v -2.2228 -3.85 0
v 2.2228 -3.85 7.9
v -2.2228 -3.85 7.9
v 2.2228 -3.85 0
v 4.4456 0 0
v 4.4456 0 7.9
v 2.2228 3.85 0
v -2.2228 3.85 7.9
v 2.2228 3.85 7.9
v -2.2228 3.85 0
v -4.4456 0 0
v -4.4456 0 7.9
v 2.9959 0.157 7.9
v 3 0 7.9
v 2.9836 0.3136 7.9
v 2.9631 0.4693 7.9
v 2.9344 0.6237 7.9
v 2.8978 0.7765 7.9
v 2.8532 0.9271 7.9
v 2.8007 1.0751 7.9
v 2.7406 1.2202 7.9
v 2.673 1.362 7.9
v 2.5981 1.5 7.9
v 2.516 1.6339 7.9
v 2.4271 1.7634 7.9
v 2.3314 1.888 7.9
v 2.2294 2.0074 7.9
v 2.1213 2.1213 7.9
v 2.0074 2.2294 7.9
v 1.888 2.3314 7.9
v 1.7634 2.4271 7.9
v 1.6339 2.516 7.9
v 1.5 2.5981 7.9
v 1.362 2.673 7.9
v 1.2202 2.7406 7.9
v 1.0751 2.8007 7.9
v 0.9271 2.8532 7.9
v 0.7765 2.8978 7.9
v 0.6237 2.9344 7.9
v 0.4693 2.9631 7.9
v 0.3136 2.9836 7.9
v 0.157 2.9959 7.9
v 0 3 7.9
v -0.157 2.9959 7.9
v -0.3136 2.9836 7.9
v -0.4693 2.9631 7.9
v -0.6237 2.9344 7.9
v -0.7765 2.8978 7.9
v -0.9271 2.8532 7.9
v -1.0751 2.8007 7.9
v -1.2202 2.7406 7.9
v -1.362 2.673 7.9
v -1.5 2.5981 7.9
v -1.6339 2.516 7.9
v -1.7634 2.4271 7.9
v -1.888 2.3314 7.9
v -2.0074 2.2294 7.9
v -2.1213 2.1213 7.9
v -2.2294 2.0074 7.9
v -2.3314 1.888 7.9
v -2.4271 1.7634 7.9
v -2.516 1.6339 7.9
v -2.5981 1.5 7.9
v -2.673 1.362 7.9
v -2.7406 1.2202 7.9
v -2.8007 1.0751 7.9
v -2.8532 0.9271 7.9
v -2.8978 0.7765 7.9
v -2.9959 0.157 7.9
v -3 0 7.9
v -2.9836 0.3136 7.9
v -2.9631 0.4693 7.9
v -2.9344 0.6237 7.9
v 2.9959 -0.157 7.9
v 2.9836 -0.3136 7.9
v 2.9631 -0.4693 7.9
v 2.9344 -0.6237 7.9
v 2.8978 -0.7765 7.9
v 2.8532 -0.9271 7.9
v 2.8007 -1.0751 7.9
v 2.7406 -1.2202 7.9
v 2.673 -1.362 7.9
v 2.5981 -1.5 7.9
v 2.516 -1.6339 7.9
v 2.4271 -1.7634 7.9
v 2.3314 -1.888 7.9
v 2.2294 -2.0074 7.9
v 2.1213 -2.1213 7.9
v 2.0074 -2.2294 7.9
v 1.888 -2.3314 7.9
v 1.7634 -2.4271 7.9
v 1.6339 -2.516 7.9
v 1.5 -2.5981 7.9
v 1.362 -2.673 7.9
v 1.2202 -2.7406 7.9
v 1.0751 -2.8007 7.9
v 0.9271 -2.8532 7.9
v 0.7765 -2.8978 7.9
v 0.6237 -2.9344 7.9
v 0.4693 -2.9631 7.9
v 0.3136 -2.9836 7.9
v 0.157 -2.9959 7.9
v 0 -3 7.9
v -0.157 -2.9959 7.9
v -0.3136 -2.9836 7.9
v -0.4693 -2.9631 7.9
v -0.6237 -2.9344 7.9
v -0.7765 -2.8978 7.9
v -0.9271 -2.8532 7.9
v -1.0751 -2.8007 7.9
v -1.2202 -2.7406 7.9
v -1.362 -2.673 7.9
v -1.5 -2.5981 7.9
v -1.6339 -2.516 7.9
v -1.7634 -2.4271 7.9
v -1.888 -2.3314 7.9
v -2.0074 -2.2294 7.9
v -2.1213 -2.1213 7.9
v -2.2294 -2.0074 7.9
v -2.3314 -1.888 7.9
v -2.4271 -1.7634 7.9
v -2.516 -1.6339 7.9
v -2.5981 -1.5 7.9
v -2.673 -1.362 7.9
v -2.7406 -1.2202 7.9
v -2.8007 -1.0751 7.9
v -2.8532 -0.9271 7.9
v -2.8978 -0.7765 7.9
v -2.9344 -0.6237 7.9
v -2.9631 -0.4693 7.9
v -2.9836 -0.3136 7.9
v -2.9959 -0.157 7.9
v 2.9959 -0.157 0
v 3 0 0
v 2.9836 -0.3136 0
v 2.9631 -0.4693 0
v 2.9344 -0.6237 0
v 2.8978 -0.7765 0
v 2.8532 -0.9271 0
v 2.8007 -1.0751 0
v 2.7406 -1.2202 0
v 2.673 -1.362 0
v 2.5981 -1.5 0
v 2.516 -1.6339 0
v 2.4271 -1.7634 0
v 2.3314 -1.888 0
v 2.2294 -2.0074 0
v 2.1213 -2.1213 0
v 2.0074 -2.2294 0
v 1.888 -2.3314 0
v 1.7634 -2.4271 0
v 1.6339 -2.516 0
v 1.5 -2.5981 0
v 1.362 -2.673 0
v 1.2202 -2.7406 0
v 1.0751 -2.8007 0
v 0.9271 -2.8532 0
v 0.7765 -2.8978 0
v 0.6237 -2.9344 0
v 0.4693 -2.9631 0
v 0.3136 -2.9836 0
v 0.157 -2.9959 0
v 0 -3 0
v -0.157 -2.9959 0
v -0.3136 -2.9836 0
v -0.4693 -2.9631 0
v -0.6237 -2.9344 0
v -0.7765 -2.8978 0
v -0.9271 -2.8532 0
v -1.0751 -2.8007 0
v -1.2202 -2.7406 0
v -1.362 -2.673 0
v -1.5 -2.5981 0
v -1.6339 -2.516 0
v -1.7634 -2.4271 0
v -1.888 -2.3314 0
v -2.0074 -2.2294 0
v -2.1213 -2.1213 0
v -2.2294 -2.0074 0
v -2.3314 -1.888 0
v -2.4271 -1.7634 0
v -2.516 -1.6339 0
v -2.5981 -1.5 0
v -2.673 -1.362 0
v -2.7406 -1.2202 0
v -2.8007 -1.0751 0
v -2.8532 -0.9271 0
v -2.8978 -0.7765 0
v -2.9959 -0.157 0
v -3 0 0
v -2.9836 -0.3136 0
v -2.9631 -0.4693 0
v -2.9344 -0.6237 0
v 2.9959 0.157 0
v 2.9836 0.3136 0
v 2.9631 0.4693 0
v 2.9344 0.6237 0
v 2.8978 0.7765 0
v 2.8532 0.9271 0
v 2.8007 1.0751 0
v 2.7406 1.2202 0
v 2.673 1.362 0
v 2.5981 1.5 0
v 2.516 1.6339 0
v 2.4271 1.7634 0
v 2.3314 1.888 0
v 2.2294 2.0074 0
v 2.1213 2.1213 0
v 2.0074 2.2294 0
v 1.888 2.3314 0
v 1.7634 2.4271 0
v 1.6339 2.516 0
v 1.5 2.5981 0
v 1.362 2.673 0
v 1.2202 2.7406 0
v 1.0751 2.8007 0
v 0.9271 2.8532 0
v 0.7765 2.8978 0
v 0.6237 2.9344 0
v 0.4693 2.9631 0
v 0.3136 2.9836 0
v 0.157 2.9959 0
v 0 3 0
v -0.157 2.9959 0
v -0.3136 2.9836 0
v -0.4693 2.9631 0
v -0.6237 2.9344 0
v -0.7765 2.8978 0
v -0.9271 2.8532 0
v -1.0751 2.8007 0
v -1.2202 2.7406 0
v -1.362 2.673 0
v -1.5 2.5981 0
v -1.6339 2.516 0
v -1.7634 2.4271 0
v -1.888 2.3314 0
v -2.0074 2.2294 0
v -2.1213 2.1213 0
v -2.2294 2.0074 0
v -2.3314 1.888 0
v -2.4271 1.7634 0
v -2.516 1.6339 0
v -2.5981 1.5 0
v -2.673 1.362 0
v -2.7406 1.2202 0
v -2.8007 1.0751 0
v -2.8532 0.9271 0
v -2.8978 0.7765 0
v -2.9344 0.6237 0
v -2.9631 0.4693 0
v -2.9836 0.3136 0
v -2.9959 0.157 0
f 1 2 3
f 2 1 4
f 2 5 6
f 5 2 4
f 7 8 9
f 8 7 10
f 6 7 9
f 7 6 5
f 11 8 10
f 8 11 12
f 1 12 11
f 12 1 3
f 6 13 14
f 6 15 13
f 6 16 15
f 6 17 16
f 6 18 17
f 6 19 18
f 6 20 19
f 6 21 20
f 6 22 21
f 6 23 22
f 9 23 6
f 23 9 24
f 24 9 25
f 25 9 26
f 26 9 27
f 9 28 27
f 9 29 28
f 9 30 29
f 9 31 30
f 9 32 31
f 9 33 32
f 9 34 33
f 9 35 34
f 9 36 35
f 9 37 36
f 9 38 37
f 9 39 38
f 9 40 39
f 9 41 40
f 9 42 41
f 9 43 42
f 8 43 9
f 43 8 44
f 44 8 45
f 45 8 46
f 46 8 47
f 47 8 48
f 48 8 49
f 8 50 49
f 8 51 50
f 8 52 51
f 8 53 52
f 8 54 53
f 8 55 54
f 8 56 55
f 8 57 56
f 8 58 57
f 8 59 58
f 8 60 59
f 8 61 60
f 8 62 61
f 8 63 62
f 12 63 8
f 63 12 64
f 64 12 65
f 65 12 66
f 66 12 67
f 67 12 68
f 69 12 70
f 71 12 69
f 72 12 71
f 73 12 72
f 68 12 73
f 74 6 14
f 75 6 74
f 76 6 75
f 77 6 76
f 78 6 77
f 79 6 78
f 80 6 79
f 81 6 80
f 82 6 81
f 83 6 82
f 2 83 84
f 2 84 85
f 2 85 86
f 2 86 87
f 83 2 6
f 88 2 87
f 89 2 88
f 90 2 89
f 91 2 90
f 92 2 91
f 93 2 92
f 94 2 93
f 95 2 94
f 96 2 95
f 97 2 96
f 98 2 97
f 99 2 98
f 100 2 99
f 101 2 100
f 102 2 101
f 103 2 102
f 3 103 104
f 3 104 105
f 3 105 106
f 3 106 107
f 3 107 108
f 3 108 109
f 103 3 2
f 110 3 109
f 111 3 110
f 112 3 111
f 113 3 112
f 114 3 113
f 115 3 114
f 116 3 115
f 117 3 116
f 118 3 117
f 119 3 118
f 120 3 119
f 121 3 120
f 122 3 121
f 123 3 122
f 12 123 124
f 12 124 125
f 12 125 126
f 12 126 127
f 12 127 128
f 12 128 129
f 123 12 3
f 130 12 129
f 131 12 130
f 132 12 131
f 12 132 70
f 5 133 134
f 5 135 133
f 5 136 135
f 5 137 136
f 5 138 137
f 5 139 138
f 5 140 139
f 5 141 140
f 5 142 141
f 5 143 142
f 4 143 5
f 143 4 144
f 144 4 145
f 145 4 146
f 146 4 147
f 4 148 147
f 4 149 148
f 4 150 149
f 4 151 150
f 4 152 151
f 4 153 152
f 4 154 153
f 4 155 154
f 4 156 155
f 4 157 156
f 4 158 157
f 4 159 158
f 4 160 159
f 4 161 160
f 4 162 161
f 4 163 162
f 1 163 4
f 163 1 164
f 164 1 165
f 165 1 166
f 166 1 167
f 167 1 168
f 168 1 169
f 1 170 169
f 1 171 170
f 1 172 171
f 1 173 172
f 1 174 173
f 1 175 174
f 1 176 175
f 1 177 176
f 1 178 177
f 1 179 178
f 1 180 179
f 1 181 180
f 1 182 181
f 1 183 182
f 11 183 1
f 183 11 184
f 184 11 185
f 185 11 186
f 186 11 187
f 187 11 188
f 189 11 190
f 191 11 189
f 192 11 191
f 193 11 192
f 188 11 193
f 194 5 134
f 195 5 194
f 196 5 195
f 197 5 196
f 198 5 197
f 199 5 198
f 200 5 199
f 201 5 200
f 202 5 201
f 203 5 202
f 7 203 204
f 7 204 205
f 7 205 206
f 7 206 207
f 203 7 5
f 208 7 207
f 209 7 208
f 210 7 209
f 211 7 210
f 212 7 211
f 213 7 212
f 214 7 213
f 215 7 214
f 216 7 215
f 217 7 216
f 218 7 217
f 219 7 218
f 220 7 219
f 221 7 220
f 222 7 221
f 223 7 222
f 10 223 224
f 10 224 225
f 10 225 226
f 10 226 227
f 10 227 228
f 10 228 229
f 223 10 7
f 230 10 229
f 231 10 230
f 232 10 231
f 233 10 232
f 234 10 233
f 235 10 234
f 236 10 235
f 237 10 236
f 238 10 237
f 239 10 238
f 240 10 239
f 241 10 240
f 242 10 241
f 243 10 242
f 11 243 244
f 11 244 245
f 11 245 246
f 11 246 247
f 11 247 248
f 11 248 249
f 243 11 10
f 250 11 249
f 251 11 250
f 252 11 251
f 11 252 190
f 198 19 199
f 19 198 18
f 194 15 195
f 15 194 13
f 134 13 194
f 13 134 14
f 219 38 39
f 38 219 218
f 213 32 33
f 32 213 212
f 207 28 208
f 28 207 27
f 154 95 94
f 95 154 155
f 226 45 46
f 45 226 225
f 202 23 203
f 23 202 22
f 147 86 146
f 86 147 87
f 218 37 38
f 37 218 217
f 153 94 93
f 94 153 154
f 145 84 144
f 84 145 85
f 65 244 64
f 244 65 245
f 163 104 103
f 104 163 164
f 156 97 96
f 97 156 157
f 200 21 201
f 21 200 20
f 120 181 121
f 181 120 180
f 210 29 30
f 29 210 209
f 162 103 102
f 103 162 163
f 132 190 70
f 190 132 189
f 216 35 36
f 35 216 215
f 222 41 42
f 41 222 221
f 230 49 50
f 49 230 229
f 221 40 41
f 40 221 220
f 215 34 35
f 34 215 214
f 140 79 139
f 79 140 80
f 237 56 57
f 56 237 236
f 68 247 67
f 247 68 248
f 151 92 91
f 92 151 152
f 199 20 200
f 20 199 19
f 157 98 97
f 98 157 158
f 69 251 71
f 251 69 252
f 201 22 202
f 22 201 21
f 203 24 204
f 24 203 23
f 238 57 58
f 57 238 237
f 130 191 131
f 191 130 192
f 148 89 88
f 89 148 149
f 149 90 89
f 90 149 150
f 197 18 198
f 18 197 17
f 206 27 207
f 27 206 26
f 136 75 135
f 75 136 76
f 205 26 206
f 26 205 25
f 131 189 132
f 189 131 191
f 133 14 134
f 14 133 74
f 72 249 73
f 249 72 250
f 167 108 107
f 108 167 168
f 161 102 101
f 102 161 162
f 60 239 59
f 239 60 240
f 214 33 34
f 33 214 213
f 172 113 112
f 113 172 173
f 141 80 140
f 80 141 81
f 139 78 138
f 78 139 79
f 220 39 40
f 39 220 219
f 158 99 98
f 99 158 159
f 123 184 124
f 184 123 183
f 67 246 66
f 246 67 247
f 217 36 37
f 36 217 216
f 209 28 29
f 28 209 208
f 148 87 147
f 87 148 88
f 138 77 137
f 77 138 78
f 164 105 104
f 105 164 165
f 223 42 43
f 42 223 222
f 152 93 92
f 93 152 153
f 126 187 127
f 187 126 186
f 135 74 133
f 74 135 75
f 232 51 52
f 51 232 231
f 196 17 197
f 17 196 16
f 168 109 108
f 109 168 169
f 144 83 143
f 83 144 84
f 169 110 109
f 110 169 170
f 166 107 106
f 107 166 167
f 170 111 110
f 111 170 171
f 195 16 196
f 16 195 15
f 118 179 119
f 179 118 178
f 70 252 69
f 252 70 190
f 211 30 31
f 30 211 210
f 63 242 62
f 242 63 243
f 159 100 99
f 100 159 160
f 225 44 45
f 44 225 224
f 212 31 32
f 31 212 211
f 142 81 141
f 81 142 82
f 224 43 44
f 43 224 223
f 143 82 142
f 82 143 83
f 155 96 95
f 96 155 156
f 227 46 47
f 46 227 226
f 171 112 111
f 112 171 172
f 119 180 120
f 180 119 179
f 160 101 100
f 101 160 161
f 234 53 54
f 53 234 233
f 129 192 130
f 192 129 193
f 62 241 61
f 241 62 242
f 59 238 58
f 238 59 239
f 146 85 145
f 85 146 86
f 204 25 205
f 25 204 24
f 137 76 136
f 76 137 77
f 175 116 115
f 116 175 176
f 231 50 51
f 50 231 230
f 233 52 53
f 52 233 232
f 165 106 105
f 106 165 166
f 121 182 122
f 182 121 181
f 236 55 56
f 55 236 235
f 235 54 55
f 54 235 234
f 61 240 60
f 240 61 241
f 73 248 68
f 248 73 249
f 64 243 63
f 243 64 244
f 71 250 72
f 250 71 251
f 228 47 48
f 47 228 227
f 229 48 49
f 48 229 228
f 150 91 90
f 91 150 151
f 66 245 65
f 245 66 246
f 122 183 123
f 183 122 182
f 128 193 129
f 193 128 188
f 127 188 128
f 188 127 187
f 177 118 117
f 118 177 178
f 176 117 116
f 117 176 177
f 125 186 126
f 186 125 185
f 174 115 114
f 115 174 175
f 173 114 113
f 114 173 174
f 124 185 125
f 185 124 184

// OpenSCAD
$fn = 120;

across_flats = 7.7;      // mm
thickness    = 7.9;      // mm
hole_d       = 6.0;      // mm (clearance as specified)

module hex_prism_af(af, h) {
    // For a regular hexagon, across-flats = 2 * apothem.
    // Circumradius R = apothem / cos(30°) = (af/2) / cos(30°)
    R = (af/2) / cos(30);
    cylinder(h=h, r=R, $fn=6);
}

difference() {
    hex_prism_af(across_flats, thickness);
    translate([0,0,-0.2])
        cylinder(h=thickness+0.4, d=hole_d, $fn=120);
}
